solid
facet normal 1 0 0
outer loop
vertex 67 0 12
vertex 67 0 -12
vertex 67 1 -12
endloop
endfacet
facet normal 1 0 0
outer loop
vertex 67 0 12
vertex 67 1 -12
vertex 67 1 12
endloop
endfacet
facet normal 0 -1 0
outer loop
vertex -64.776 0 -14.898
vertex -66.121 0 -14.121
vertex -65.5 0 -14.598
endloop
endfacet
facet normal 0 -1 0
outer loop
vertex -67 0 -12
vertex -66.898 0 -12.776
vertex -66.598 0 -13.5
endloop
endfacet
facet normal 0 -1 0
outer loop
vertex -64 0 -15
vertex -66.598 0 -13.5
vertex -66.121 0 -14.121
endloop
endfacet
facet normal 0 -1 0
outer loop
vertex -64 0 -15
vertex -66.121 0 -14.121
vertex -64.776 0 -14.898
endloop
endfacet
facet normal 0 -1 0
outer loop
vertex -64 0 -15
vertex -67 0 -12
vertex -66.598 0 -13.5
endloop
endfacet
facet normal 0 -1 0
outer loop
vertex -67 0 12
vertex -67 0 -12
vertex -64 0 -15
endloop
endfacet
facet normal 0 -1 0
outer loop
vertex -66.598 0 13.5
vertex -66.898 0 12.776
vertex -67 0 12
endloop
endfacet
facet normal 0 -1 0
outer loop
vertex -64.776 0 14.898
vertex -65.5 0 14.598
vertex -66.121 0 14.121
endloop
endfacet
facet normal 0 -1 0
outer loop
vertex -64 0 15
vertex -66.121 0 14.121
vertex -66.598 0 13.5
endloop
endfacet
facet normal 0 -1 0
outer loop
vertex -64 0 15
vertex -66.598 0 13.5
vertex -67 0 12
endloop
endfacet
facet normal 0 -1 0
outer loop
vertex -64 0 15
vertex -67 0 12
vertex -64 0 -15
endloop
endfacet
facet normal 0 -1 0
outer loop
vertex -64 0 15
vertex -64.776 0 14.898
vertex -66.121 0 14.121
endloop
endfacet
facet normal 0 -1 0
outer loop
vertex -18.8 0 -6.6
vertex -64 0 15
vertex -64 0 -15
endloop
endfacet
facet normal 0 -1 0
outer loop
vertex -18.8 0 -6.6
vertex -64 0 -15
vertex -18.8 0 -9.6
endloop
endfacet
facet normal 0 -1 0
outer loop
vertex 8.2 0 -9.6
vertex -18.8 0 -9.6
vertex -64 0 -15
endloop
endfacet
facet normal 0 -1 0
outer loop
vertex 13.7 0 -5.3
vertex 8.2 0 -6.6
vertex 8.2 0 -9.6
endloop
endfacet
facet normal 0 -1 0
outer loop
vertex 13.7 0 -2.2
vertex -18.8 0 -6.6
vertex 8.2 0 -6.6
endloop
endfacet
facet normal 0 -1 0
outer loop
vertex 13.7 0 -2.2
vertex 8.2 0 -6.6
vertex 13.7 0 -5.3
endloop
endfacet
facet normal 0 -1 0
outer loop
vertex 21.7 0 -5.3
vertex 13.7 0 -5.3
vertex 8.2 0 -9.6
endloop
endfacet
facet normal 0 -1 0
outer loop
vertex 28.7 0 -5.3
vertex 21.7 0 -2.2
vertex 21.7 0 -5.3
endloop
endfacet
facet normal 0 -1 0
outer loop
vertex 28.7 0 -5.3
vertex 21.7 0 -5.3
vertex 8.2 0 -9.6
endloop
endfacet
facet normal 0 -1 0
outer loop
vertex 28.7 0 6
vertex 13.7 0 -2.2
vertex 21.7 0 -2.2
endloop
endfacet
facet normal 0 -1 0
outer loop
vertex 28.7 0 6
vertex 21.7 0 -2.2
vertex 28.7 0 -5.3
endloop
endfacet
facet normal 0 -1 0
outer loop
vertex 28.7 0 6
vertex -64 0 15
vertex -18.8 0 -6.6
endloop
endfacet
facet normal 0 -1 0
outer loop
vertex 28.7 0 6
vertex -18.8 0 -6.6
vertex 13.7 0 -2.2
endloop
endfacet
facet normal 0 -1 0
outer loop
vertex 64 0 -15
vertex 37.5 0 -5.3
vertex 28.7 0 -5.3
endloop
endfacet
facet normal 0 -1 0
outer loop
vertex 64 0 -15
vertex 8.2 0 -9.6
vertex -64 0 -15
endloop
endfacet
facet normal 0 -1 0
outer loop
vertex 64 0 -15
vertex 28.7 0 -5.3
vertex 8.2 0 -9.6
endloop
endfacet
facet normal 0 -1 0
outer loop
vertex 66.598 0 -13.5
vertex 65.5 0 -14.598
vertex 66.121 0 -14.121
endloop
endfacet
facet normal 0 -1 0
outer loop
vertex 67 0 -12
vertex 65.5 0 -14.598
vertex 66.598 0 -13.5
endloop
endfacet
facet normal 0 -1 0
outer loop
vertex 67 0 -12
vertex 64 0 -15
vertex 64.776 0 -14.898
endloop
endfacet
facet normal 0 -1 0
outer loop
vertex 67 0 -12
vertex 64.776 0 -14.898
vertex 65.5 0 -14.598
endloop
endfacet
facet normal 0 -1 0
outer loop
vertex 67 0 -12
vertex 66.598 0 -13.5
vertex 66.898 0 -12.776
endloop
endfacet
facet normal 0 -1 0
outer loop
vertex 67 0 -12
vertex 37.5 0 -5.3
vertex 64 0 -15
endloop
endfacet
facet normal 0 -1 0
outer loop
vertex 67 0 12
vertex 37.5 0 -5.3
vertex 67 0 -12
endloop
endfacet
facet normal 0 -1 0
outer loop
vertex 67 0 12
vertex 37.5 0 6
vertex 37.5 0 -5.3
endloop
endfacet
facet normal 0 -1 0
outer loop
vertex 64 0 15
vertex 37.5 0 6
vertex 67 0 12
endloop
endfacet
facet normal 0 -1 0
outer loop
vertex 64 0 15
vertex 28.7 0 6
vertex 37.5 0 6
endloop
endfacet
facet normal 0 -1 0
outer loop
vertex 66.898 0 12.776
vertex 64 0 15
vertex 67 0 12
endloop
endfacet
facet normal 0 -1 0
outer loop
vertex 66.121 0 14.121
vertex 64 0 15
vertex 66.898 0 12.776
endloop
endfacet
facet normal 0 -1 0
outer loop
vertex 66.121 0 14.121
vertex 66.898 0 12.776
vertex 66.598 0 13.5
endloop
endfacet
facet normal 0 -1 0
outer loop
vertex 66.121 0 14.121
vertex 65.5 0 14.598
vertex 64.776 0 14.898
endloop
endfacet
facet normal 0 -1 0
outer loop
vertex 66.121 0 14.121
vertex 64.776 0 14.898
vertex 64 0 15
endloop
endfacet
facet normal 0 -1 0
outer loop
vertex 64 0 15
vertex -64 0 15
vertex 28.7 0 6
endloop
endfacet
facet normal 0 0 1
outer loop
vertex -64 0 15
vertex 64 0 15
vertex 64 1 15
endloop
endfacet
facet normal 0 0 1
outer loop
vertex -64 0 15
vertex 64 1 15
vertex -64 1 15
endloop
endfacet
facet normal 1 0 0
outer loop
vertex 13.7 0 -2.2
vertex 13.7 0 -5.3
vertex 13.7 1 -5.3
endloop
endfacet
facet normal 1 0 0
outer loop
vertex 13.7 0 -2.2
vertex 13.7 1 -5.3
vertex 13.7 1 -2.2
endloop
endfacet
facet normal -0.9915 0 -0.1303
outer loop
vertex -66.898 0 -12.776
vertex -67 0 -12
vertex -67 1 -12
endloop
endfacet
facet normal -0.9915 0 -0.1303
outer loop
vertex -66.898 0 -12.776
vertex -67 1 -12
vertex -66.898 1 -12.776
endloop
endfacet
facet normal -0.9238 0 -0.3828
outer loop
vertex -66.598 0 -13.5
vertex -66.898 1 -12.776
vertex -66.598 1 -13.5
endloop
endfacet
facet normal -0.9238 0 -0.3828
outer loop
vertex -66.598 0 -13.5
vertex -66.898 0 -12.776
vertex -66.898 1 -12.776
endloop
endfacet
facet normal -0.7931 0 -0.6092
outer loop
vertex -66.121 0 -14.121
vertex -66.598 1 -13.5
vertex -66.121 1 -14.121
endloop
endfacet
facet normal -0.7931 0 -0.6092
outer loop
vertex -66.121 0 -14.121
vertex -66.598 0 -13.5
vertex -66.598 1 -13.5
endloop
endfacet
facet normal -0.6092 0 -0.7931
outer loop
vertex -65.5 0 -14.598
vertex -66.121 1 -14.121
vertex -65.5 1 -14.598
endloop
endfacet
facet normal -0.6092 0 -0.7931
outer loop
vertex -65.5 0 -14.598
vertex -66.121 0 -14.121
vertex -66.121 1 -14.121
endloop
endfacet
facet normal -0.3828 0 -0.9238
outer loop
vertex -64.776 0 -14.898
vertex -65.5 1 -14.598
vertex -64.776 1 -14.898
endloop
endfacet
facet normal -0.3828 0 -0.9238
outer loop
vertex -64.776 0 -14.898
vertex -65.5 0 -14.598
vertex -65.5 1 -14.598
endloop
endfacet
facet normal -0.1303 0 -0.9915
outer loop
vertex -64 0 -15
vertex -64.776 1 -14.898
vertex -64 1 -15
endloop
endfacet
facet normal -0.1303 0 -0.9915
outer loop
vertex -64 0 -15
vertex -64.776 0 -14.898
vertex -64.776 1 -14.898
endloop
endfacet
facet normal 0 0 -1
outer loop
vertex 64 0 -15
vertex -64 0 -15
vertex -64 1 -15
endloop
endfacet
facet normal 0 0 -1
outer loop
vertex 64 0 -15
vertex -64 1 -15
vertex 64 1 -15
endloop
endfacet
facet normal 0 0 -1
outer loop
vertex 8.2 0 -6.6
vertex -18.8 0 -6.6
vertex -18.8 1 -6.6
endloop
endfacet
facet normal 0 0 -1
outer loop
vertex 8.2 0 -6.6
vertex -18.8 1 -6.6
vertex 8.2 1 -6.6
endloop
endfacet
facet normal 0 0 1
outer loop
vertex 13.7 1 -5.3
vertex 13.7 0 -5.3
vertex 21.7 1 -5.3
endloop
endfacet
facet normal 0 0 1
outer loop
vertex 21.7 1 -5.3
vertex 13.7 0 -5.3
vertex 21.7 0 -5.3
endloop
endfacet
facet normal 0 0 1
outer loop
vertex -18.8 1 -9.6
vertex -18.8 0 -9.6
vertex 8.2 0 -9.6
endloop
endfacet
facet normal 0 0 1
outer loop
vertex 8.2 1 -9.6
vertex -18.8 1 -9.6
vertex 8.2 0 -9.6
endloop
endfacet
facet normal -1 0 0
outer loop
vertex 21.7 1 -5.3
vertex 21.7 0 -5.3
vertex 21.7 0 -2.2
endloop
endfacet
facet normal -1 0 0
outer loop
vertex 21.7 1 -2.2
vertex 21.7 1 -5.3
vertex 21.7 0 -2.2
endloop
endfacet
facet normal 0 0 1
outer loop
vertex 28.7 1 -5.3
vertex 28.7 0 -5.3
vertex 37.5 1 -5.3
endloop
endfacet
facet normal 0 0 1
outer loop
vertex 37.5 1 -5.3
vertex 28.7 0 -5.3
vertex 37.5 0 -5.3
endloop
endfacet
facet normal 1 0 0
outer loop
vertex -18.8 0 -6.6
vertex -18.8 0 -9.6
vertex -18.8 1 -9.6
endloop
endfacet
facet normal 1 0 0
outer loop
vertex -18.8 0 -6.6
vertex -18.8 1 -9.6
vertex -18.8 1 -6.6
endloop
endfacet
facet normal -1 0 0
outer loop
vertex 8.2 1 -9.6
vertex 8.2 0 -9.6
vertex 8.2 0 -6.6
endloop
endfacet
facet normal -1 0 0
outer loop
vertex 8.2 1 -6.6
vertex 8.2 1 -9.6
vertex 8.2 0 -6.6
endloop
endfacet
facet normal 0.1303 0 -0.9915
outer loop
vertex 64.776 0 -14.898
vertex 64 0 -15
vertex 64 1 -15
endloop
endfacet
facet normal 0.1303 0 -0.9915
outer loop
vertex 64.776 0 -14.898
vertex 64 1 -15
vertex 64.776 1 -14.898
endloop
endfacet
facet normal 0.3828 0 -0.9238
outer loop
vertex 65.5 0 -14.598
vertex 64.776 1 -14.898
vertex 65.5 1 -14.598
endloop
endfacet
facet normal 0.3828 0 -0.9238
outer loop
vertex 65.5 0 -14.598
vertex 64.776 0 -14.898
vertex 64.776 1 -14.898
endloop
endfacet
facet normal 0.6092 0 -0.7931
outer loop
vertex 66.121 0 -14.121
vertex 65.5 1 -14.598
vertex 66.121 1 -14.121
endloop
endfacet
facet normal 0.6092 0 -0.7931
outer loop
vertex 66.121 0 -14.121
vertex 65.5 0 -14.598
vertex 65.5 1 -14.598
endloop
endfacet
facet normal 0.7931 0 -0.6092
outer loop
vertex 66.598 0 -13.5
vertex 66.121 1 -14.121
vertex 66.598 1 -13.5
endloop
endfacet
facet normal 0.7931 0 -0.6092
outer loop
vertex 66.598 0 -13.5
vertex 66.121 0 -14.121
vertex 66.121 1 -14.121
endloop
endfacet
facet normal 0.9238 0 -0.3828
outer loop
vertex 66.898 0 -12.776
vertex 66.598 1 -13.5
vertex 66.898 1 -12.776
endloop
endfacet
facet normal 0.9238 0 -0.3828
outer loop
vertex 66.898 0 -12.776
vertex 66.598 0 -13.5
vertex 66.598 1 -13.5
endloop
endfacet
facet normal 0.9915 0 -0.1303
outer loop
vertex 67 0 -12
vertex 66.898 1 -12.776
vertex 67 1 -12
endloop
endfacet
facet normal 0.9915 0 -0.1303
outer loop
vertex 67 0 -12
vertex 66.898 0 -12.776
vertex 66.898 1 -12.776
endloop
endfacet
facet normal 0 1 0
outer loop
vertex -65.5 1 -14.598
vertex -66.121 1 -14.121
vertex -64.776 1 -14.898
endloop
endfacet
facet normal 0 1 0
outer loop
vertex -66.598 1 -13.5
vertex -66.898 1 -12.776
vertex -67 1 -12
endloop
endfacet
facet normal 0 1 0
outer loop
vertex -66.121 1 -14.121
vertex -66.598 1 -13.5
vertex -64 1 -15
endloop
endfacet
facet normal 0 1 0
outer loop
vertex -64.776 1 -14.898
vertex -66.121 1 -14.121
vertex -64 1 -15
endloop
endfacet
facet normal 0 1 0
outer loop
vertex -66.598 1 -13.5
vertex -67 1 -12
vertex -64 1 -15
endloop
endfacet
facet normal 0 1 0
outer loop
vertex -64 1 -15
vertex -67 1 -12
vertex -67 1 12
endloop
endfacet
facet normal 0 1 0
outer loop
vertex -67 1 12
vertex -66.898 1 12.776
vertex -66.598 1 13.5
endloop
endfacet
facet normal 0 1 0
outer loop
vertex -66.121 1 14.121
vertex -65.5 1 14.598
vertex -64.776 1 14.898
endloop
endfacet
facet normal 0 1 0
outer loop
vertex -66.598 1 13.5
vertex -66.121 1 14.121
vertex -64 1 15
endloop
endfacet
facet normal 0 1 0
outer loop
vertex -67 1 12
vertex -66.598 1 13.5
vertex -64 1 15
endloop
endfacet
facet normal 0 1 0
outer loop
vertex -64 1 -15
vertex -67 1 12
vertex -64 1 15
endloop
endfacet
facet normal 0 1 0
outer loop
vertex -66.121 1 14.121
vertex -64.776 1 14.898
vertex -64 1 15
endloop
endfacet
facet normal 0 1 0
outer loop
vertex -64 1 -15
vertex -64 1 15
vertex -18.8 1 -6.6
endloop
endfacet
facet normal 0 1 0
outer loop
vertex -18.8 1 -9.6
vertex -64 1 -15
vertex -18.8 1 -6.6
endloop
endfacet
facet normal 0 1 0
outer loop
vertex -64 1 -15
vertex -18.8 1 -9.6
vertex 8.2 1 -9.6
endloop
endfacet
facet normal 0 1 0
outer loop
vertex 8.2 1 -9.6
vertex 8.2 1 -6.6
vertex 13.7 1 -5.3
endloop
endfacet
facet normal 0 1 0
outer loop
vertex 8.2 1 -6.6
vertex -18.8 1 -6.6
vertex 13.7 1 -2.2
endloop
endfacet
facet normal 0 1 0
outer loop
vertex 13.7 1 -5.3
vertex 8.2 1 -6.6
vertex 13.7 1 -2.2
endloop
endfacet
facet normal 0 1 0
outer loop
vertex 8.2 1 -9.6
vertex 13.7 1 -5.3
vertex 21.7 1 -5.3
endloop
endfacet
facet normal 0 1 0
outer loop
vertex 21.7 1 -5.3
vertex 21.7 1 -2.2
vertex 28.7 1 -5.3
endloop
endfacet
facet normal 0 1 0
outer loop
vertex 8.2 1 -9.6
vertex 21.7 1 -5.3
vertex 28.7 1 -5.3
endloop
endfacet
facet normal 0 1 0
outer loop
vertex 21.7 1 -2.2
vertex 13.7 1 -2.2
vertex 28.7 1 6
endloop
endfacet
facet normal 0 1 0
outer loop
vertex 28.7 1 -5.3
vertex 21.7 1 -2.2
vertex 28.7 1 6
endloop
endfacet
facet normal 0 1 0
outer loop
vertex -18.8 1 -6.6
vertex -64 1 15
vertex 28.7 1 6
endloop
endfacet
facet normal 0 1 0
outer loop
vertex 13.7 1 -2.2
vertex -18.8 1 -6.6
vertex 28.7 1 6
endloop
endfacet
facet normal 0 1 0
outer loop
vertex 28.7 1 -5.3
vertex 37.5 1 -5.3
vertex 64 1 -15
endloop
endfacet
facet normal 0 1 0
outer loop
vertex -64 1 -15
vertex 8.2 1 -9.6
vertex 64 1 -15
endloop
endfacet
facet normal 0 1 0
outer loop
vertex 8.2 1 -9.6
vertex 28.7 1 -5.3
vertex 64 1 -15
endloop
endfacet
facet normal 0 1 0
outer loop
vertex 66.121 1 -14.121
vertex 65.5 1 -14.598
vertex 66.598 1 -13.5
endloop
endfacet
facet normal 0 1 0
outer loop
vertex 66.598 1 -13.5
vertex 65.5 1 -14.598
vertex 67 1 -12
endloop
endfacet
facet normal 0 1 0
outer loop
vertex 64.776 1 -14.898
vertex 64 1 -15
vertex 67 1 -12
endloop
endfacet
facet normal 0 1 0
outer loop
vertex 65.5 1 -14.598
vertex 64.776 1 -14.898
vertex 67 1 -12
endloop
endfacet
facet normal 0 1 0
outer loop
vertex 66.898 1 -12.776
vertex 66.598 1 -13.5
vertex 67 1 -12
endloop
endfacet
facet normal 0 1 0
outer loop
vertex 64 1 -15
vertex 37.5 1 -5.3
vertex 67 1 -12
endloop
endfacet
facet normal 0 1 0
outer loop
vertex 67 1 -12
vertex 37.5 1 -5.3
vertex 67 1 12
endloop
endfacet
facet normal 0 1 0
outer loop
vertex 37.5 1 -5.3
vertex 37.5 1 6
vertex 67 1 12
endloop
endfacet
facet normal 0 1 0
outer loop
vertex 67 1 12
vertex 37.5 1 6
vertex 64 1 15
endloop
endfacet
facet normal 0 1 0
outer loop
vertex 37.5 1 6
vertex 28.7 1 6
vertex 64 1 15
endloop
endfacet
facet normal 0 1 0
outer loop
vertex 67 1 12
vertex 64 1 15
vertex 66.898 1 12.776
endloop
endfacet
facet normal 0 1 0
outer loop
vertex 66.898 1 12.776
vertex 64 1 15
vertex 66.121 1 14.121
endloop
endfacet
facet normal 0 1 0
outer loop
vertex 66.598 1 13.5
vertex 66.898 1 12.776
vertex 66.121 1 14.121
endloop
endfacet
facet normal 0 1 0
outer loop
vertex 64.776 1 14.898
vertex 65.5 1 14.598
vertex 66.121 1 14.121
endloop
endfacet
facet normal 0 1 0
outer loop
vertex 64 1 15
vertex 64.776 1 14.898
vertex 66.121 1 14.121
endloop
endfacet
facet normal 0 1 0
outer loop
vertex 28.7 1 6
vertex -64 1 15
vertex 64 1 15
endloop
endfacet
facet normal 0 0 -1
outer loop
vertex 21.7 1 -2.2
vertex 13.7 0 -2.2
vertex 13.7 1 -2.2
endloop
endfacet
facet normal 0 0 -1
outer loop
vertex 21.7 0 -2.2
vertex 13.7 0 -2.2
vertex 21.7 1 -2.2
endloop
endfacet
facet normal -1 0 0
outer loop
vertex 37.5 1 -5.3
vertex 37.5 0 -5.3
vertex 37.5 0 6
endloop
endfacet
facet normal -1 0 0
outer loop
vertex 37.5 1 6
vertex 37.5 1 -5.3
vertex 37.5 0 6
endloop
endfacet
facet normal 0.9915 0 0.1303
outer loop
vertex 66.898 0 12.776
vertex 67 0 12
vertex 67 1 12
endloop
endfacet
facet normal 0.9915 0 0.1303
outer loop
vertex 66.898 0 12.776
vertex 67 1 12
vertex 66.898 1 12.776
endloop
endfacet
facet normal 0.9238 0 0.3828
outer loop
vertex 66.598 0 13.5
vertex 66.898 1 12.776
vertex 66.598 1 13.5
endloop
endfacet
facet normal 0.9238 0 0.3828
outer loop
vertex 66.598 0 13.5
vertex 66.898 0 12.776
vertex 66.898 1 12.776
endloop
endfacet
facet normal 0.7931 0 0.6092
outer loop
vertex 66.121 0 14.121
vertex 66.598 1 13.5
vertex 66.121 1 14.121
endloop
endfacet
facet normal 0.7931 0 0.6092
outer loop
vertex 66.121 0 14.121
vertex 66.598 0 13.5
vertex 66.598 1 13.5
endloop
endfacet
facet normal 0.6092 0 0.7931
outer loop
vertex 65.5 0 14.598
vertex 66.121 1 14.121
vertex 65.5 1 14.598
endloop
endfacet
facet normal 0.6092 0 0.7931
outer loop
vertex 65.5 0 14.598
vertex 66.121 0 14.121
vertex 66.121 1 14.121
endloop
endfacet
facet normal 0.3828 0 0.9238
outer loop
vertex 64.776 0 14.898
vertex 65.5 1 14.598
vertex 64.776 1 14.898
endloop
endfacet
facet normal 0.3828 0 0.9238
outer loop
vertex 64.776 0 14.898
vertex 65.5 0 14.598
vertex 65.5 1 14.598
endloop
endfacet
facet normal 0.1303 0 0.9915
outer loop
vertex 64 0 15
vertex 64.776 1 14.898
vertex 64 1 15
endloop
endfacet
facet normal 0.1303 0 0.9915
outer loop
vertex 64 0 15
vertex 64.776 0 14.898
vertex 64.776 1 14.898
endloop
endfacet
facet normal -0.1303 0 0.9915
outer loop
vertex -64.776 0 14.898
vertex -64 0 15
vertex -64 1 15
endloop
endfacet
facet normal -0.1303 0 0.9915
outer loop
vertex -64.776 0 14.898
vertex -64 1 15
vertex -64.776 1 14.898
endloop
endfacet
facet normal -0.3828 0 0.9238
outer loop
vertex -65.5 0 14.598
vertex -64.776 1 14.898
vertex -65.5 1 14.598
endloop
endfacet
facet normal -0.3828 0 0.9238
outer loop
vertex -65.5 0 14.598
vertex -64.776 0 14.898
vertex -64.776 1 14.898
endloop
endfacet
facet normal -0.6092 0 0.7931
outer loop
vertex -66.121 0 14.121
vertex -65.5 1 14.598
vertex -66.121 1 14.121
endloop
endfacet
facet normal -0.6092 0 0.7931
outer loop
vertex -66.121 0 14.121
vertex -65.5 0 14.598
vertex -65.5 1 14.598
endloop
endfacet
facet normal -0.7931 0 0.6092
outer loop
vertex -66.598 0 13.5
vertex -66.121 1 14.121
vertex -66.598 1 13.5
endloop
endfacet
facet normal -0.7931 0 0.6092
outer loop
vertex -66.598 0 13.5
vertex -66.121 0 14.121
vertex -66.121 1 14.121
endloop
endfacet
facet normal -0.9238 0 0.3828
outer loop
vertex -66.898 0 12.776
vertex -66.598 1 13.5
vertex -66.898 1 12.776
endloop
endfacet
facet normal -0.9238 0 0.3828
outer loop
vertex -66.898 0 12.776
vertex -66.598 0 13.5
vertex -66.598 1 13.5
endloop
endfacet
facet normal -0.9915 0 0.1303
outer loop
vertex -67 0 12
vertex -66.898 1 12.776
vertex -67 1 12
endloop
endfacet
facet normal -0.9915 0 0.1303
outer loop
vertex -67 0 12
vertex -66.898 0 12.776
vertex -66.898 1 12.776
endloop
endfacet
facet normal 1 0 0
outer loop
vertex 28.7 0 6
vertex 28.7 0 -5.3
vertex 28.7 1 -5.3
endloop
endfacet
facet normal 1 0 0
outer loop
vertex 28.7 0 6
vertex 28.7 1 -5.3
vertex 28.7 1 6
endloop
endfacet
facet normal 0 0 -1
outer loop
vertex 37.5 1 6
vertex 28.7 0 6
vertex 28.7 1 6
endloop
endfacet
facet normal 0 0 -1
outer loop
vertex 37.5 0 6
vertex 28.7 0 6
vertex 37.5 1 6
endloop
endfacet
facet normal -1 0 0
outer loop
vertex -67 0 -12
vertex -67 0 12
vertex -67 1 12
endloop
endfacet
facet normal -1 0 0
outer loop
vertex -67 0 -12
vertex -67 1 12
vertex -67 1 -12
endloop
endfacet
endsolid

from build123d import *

# Parameters (mm, degrees)
F0_W     = 27
F0_H     = 3
F0_W_2   = 8
F0_H_2   = 3.1
F0_W_3   = 8.8
F0_H_3   = 11.3
F1_DEPTH = 1


with BuildPart() as f1:
    # F0 (on Front) → F1 (new body)
    with BuildSketch(Plane.XZ):
        with BuildLine():
            Line((64, 15), (-64, 15))
            ThreePointArc((-64, 15), (-66.12132, 14.12132), (-67, 12))
            Line((-67, 12), (-67, -12))
            ThreePointArc((-67, -12), (-66.12132, -14.12132), (-64, -15))
            Line((-64, -15), (64, -15))
            ThreePointArc((64, -15), (66.12132, -14.12132), (67, -12))
            Line((67, -12), (67, 12))
            ThreePointArc((67, 12), (66.12132, 14.12132), (64, 15))
        make_face()
        with Locations((-5.3, -8.1)):
            Rectangle(F0_W, F0_H, mode=Mode.SUBTRACT)
        with Locations((17.7, -3.75)):
            Rectangle(F0_W_2, F0_H_2, mode=Mode.SUBTRACT)
        with Locations((33.1, 0.35)):
            Rectangle(F0_W_3, F0_H_3, mode=Mode.SUBTRACT)
    extrude(amount=-F1_DEPTH)


solid = f1.part
